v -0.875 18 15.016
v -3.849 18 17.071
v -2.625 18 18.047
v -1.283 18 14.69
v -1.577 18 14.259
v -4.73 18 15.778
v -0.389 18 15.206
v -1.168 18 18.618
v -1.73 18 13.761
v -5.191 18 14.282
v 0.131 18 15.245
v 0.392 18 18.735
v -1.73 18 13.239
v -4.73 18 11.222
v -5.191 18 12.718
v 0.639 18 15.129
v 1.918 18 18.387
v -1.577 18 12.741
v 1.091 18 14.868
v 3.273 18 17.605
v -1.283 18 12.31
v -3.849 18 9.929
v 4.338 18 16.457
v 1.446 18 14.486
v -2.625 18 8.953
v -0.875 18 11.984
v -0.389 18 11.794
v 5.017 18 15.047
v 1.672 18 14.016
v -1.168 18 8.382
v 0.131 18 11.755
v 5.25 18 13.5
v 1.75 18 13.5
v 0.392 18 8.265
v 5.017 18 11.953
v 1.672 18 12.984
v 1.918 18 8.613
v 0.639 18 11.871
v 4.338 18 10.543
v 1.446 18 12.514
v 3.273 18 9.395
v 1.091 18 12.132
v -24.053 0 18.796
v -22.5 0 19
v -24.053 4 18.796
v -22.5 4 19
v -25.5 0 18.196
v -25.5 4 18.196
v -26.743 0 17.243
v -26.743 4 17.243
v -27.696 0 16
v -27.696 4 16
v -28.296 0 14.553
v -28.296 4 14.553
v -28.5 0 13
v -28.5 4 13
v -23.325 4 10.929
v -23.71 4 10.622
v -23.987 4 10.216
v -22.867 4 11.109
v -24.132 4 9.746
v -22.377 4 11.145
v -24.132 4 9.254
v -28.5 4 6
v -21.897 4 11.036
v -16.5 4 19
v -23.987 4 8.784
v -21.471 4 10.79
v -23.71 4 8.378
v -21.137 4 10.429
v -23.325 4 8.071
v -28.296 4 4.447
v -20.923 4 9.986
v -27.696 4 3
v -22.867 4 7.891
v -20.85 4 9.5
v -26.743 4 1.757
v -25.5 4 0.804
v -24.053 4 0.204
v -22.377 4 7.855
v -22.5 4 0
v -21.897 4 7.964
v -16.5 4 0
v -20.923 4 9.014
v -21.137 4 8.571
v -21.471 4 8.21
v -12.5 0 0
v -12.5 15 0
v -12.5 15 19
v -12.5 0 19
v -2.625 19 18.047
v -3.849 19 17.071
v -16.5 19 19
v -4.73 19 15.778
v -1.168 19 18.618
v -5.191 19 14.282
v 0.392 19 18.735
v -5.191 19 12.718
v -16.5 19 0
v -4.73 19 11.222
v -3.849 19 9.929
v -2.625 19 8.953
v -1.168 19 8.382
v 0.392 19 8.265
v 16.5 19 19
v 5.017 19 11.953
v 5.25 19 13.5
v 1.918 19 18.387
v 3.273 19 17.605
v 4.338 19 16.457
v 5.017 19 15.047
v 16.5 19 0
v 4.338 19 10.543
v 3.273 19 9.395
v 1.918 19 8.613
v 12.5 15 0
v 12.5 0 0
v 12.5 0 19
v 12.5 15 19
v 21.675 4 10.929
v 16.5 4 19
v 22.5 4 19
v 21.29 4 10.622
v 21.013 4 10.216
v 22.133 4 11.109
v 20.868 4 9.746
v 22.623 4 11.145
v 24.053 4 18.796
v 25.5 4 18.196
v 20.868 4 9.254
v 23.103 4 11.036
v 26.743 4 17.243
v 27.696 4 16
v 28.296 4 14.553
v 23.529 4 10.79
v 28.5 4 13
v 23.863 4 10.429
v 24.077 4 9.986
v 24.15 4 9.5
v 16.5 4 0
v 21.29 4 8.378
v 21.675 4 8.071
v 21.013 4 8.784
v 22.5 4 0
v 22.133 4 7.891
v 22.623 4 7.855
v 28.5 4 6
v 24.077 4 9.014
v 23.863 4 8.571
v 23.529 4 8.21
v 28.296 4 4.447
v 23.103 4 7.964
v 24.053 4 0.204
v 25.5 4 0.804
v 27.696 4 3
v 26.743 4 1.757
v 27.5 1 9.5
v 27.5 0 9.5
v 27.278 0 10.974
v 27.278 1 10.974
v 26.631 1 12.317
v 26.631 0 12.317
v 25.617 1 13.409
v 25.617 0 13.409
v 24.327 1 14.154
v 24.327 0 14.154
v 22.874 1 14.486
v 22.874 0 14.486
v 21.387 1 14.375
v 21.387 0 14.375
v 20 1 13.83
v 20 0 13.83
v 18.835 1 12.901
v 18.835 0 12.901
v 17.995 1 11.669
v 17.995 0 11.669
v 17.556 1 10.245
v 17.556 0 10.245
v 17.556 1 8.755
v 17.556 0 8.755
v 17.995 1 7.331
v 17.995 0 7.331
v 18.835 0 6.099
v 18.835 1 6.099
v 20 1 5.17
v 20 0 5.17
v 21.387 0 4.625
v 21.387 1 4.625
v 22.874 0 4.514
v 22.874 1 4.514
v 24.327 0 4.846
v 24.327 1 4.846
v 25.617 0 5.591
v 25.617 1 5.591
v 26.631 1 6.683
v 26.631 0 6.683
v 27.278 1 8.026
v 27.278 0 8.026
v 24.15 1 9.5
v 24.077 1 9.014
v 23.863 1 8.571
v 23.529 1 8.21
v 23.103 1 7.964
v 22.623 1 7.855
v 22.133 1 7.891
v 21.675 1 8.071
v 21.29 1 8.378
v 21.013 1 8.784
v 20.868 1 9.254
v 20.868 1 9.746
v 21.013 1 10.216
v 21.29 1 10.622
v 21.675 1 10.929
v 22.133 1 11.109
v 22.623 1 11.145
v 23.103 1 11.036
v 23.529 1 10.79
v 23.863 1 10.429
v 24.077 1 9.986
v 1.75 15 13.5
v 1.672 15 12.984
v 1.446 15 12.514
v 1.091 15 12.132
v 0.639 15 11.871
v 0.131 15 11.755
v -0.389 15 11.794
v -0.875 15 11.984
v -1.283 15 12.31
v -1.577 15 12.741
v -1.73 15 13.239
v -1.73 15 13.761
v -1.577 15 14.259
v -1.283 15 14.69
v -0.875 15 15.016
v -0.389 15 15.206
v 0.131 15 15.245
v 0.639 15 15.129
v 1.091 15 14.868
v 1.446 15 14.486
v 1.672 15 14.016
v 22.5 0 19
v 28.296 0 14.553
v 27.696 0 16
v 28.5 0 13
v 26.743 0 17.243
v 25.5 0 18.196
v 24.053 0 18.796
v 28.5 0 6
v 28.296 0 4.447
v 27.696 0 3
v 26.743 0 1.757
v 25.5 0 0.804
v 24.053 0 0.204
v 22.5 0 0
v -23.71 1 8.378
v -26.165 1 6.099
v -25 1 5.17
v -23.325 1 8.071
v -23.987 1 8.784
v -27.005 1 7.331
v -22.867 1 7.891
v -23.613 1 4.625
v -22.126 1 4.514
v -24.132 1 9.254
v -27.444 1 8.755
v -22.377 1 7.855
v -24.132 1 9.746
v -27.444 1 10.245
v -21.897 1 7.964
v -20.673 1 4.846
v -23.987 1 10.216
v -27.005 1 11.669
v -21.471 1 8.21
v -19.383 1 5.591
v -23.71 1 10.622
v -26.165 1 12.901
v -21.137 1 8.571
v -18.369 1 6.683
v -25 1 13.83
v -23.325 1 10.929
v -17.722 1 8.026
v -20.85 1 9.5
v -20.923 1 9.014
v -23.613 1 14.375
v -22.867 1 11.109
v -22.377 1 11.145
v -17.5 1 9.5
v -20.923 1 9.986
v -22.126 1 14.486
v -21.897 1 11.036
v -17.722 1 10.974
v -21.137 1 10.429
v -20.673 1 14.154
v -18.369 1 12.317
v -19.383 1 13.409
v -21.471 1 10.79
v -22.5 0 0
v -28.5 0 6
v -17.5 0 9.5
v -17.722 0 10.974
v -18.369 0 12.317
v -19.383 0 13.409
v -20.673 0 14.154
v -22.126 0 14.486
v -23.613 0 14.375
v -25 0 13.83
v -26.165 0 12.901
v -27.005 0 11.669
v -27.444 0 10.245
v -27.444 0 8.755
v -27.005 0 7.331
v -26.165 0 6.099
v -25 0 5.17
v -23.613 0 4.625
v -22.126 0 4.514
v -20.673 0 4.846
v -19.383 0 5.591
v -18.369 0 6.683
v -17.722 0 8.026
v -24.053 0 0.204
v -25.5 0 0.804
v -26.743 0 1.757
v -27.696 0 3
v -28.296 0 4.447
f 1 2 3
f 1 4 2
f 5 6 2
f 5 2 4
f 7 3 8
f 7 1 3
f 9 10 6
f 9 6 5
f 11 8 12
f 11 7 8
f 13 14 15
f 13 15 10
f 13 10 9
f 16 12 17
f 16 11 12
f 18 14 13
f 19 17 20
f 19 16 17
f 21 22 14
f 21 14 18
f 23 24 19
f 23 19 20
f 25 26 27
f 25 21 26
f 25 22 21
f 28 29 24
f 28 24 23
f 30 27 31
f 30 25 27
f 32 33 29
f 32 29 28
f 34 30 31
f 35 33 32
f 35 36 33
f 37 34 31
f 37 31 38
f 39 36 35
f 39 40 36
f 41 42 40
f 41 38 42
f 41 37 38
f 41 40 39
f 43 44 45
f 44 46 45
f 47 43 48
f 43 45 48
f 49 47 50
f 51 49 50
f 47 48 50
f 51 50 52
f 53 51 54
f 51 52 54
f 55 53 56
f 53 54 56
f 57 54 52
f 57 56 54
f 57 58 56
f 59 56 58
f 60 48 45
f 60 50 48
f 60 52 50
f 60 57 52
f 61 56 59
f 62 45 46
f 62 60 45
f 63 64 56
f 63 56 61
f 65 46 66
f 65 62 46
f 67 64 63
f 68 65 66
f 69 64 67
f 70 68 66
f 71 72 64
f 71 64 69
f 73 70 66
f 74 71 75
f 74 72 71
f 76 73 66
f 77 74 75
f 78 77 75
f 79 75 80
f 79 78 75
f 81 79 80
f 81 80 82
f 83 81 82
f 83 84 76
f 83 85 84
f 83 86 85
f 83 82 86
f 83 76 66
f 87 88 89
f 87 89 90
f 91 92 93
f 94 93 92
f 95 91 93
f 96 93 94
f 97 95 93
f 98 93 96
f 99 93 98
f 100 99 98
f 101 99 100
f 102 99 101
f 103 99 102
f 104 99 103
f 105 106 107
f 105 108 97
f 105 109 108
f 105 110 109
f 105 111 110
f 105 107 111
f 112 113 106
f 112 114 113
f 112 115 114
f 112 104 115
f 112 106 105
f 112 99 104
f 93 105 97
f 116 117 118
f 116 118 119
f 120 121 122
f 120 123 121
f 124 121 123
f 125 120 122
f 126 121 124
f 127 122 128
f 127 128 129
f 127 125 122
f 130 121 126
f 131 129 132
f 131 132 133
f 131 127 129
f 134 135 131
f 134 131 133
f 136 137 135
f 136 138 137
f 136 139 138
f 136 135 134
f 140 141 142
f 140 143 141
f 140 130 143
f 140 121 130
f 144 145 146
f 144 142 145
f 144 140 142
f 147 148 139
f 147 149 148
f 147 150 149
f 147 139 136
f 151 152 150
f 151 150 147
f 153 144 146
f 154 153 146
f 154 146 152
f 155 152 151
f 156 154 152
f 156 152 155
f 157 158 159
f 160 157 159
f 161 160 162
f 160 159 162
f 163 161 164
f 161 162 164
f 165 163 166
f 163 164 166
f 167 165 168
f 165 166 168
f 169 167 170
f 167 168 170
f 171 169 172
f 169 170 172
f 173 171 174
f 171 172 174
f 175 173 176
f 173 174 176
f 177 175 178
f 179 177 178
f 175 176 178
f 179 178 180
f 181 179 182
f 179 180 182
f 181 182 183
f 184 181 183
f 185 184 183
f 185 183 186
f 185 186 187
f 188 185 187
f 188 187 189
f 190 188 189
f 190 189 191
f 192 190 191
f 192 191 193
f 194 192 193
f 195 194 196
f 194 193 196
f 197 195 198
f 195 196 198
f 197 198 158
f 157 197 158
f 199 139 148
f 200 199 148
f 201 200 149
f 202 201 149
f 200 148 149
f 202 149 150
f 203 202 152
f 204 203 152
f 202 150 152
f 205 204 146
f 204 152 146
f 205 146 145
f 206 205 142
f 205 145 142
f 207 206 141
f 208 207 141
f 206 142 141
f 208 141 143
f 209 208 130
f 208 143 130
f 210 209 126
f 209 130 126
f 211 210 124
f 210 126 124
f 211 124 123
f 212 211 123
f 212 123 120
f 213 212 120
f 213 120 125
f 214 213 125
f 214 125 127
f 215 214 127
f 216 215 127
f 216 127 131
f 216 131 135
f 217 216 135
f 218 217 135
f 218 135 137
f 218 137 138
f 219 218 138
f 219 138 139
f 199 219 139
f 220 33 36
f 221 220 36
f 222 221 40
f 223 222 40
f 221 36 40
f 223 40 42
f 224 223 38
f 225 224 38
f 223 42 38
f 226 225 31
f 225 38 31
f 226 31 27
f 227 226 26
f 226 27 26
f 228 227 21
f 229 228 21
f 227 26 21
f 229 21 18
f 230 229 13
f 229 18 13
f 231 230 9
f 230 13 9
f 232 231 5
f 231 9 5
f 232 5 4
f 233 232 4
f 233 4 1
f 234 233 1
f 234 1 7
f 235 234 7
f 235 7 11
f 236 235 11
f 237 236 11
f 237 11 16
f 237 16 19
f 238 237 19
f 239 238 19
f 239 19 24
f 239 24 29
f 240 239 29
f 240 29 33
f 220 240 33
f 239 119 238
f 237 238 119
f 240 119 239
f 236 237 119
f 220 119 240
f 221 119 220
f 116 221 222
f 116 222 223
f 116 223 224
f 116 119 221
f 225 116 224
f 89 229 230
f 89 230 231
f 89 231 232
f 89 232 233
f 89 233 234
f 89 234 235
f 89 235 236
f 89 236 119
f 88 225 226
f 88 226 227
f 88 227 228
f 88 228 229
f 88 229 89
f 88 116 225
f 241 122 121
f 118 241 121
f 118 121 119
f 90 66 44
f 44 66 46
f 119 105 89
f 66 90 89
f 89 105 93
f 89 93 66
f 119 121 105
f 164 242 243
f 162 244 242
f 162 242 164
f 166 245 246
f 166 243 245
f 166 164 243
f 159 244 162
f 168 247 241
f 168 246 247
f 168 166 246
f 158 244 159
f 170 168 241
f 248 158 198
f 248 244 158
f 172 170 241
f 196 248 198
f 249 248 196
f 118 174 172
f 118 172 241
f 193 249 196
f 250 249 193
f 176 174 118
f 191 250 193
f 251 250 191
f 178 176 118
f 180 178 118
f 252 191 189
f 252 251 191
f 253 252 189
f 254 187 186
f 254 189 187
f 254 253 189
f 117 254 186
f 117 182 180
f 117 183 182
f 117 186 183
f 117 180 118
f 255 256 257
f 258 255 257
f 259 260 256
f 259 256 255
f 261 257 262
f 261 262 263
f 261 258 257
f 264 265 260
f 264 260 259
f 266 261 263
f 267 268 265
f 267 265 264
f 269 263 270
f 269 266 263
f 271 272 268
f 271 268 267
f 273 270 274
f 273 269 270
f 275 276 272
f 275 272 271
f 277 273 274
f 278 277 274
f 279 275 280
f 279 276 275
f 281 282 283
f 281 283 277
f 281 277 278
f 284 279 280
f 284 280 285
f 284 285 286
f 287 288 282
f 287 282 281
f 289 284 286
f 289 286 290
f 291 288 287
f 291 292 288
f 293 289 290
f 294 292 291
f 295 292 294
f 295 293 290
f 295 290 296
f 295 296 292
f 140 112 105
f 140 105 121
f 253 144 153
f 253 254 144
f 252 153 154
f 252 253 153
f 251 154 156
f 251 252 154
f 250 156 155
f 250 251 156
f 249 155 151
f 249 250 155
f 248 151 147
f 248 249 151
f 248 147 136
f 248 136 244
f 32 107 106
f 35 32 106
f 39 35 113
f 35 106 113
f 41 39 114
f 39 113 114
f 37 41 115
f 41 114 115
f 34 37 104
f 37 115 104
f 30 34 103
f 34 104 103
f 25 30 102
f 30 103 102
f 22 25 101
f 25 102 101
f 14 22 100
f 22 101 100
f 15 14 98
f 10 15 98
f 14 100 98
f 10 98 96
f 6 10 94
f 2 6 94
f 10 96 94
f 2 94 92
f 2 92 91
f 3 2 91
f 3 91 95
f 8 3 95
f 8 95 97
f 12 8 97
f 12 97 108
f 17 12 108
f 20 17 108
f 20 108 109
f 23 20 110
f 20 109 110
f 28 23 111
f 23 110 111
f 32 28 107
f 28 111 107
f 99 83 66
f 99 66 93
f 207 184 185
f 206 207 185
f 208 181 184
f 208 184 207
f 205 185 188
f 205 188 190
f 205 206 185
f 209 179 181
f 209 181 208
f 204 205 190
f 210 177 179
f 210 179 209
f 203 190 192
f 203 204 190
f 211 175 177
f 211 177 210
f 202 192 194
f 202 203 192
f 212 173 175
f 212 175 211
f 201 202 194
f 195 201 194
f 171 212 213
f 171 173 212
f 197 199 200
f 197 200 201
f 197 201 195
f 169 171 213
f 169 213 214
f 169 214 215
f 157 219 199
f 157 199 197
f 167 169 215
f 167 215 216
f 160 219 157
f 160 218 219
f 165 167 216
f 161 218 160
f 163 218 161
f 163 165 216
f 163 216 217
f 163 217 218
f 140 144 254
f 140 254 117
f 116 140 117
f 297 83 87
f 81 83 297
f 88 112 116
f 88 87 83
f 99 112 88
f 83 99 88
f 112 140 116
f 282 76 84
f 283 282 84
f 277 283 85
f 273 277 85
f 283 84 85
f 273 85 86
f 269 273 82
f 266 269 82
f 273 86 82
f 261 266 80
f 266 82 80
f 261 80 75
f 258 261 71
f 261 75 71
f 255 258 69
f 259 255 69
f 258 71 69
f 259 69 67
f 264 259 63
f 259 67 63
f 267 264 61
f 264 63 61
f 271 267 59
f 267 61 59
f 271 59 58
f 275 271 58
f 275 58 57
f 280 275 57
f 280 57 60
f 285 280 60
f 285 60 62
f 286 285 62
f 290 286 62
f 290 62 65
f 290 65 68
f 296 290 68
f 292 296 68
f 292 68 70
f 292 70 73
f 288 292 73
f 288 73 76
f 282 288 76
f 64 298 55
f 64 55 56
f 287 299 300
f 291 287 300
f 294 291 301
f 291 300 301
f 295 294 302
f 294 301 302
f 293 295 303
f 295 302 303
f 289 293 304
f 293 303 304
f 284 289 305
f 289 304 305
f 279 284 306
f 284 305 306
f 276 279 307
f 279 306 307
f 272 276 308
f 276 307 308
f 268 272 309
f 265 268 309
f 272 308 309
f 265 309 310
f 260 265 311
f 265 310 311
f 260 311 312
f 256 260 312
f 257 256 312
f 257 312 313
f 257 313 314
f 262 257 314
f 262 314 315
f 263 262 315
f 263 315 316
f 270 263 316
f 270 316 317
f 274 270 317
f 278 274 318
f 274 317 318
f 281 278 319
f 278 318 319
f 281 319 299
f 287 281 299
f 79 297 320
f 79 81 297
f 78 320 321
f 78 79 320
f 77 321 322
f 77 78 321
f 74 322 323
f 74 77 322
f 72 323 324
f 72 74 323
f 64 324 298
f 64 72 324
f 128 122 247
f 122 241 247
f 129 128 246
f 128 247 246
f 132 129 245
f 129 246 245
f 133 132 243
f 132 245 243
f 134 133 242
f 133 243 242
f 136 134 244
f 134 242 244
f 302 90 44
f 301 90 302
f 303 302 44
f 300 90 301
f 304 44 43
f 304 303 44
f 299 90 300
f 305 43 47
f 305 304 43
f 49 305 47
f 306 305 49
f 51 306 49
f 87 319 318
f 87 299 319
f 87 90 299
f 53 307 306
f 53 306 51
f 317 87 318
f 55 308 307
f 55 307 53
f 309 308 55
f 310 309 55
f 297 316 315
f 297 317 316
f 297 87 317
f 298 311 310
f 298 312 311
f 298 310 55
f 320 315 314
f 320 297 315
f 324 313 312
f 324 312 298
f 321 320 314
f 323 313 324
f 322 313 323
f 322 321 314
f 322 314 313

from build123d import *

# Parameters (mm, degrees)
RESSALTO_EXTRUS_O1_DEPTH   = 19
ESBO_O2_R                  = 1.75
ESBO_O2_R_2                = 1.65
CORTE_EXTRUS_O1_DEPTH      = 1
CORTE_EXTRUS_O1_DEPTH_BACK = 20
FILETE1_R                  = 6
ESBO_O3_R                  = 5
CORTE_EXTRUS_O2_DEPTH      = 1
ESBO_O4_R                  = 5.25
CORTE_EXTRUS_O3_DEPTH      = 1


with BuildPart() as part:
    # Esboço1 → Ressalto-extrusão1 (new body)
    with BuildSketch(Plane.XY):
        Polygon((12.5, 15), (-12.5, 15), (-12.5, 0), (-28.5, 0), (-28.5, 4), (-16.5, 4), (-16.5, 19), (16.5, 19), (16.5, 4), (28.5, 4), (28.5, 0), (12.5, 0), align=None)
    extrude(amount=RESSALTO_EXTRUS_O1_DEPTH)

    # Esboço2 → Corte-extrusão1 (cut, two sides)
    with BuildSketch(Plane(origin=(0, 19, 0), x_dir=(1, 0, 0), z_dir=(0, 1, 0))) as corte_extrus_o1_sk:
        with Locations((0, -13.5)):
            Circle(ESBO_O2_R)
        with Locations((-22.5, -9.5)):
            Circle(ESBO_O2_R_2)
        with Locations((22.5, -9.5)):
            Circle(ESBO_O2_R_2)
    extrude(amount=CORTE_EXTRUS_O1_DEPTH, mode=Mode.SUBTRACT)
    extrude(corte_extrus_o1_sk.sketch, amount=-CORTE_EXTRUS_O1_DEPTH_BACK, mode=Mode.SUBTRACT)

    # Filete1
    filete1_edges = [part.edges().sort_by_distance(p)[0] for p in [
        (28.5, 2, 0),
        (-28.5, 2, 0),
        (-28.5, 2, 19),
        (28.5, 2, 19),
    ]]
    fillet(filete1_edges, radius=FILETE1_R)

    # Esboço3 → Corte-extrusão2 (cut)
    with BuildSketch(Plane.XZ):
        with Locations((-22.5, 9.5)):
            Circle(ESBO_O3_R)
        with Locations((22.5, 9.5)):
            Circle(ESBO_O3_R)
    extrude(amount=-CORTE_EXTRUS_O2_DEPTH, mode=Mode.SUBTRACT)

    # Esboço4 → Corte-extrusão3 (cut)
    with BuildSketch(Plane(origin=(0, 19, 0), x_dir=(1, 0, 0), z_dir=(0, 1, 0))):
        with Locations((0, -13.5)):
            Circle(ESBO_O4_R)
    extrude(amount=-CORTE_EXTRUS_O3_DEPTH, mode=Mode.SUBTRACT)


solid = part.part
